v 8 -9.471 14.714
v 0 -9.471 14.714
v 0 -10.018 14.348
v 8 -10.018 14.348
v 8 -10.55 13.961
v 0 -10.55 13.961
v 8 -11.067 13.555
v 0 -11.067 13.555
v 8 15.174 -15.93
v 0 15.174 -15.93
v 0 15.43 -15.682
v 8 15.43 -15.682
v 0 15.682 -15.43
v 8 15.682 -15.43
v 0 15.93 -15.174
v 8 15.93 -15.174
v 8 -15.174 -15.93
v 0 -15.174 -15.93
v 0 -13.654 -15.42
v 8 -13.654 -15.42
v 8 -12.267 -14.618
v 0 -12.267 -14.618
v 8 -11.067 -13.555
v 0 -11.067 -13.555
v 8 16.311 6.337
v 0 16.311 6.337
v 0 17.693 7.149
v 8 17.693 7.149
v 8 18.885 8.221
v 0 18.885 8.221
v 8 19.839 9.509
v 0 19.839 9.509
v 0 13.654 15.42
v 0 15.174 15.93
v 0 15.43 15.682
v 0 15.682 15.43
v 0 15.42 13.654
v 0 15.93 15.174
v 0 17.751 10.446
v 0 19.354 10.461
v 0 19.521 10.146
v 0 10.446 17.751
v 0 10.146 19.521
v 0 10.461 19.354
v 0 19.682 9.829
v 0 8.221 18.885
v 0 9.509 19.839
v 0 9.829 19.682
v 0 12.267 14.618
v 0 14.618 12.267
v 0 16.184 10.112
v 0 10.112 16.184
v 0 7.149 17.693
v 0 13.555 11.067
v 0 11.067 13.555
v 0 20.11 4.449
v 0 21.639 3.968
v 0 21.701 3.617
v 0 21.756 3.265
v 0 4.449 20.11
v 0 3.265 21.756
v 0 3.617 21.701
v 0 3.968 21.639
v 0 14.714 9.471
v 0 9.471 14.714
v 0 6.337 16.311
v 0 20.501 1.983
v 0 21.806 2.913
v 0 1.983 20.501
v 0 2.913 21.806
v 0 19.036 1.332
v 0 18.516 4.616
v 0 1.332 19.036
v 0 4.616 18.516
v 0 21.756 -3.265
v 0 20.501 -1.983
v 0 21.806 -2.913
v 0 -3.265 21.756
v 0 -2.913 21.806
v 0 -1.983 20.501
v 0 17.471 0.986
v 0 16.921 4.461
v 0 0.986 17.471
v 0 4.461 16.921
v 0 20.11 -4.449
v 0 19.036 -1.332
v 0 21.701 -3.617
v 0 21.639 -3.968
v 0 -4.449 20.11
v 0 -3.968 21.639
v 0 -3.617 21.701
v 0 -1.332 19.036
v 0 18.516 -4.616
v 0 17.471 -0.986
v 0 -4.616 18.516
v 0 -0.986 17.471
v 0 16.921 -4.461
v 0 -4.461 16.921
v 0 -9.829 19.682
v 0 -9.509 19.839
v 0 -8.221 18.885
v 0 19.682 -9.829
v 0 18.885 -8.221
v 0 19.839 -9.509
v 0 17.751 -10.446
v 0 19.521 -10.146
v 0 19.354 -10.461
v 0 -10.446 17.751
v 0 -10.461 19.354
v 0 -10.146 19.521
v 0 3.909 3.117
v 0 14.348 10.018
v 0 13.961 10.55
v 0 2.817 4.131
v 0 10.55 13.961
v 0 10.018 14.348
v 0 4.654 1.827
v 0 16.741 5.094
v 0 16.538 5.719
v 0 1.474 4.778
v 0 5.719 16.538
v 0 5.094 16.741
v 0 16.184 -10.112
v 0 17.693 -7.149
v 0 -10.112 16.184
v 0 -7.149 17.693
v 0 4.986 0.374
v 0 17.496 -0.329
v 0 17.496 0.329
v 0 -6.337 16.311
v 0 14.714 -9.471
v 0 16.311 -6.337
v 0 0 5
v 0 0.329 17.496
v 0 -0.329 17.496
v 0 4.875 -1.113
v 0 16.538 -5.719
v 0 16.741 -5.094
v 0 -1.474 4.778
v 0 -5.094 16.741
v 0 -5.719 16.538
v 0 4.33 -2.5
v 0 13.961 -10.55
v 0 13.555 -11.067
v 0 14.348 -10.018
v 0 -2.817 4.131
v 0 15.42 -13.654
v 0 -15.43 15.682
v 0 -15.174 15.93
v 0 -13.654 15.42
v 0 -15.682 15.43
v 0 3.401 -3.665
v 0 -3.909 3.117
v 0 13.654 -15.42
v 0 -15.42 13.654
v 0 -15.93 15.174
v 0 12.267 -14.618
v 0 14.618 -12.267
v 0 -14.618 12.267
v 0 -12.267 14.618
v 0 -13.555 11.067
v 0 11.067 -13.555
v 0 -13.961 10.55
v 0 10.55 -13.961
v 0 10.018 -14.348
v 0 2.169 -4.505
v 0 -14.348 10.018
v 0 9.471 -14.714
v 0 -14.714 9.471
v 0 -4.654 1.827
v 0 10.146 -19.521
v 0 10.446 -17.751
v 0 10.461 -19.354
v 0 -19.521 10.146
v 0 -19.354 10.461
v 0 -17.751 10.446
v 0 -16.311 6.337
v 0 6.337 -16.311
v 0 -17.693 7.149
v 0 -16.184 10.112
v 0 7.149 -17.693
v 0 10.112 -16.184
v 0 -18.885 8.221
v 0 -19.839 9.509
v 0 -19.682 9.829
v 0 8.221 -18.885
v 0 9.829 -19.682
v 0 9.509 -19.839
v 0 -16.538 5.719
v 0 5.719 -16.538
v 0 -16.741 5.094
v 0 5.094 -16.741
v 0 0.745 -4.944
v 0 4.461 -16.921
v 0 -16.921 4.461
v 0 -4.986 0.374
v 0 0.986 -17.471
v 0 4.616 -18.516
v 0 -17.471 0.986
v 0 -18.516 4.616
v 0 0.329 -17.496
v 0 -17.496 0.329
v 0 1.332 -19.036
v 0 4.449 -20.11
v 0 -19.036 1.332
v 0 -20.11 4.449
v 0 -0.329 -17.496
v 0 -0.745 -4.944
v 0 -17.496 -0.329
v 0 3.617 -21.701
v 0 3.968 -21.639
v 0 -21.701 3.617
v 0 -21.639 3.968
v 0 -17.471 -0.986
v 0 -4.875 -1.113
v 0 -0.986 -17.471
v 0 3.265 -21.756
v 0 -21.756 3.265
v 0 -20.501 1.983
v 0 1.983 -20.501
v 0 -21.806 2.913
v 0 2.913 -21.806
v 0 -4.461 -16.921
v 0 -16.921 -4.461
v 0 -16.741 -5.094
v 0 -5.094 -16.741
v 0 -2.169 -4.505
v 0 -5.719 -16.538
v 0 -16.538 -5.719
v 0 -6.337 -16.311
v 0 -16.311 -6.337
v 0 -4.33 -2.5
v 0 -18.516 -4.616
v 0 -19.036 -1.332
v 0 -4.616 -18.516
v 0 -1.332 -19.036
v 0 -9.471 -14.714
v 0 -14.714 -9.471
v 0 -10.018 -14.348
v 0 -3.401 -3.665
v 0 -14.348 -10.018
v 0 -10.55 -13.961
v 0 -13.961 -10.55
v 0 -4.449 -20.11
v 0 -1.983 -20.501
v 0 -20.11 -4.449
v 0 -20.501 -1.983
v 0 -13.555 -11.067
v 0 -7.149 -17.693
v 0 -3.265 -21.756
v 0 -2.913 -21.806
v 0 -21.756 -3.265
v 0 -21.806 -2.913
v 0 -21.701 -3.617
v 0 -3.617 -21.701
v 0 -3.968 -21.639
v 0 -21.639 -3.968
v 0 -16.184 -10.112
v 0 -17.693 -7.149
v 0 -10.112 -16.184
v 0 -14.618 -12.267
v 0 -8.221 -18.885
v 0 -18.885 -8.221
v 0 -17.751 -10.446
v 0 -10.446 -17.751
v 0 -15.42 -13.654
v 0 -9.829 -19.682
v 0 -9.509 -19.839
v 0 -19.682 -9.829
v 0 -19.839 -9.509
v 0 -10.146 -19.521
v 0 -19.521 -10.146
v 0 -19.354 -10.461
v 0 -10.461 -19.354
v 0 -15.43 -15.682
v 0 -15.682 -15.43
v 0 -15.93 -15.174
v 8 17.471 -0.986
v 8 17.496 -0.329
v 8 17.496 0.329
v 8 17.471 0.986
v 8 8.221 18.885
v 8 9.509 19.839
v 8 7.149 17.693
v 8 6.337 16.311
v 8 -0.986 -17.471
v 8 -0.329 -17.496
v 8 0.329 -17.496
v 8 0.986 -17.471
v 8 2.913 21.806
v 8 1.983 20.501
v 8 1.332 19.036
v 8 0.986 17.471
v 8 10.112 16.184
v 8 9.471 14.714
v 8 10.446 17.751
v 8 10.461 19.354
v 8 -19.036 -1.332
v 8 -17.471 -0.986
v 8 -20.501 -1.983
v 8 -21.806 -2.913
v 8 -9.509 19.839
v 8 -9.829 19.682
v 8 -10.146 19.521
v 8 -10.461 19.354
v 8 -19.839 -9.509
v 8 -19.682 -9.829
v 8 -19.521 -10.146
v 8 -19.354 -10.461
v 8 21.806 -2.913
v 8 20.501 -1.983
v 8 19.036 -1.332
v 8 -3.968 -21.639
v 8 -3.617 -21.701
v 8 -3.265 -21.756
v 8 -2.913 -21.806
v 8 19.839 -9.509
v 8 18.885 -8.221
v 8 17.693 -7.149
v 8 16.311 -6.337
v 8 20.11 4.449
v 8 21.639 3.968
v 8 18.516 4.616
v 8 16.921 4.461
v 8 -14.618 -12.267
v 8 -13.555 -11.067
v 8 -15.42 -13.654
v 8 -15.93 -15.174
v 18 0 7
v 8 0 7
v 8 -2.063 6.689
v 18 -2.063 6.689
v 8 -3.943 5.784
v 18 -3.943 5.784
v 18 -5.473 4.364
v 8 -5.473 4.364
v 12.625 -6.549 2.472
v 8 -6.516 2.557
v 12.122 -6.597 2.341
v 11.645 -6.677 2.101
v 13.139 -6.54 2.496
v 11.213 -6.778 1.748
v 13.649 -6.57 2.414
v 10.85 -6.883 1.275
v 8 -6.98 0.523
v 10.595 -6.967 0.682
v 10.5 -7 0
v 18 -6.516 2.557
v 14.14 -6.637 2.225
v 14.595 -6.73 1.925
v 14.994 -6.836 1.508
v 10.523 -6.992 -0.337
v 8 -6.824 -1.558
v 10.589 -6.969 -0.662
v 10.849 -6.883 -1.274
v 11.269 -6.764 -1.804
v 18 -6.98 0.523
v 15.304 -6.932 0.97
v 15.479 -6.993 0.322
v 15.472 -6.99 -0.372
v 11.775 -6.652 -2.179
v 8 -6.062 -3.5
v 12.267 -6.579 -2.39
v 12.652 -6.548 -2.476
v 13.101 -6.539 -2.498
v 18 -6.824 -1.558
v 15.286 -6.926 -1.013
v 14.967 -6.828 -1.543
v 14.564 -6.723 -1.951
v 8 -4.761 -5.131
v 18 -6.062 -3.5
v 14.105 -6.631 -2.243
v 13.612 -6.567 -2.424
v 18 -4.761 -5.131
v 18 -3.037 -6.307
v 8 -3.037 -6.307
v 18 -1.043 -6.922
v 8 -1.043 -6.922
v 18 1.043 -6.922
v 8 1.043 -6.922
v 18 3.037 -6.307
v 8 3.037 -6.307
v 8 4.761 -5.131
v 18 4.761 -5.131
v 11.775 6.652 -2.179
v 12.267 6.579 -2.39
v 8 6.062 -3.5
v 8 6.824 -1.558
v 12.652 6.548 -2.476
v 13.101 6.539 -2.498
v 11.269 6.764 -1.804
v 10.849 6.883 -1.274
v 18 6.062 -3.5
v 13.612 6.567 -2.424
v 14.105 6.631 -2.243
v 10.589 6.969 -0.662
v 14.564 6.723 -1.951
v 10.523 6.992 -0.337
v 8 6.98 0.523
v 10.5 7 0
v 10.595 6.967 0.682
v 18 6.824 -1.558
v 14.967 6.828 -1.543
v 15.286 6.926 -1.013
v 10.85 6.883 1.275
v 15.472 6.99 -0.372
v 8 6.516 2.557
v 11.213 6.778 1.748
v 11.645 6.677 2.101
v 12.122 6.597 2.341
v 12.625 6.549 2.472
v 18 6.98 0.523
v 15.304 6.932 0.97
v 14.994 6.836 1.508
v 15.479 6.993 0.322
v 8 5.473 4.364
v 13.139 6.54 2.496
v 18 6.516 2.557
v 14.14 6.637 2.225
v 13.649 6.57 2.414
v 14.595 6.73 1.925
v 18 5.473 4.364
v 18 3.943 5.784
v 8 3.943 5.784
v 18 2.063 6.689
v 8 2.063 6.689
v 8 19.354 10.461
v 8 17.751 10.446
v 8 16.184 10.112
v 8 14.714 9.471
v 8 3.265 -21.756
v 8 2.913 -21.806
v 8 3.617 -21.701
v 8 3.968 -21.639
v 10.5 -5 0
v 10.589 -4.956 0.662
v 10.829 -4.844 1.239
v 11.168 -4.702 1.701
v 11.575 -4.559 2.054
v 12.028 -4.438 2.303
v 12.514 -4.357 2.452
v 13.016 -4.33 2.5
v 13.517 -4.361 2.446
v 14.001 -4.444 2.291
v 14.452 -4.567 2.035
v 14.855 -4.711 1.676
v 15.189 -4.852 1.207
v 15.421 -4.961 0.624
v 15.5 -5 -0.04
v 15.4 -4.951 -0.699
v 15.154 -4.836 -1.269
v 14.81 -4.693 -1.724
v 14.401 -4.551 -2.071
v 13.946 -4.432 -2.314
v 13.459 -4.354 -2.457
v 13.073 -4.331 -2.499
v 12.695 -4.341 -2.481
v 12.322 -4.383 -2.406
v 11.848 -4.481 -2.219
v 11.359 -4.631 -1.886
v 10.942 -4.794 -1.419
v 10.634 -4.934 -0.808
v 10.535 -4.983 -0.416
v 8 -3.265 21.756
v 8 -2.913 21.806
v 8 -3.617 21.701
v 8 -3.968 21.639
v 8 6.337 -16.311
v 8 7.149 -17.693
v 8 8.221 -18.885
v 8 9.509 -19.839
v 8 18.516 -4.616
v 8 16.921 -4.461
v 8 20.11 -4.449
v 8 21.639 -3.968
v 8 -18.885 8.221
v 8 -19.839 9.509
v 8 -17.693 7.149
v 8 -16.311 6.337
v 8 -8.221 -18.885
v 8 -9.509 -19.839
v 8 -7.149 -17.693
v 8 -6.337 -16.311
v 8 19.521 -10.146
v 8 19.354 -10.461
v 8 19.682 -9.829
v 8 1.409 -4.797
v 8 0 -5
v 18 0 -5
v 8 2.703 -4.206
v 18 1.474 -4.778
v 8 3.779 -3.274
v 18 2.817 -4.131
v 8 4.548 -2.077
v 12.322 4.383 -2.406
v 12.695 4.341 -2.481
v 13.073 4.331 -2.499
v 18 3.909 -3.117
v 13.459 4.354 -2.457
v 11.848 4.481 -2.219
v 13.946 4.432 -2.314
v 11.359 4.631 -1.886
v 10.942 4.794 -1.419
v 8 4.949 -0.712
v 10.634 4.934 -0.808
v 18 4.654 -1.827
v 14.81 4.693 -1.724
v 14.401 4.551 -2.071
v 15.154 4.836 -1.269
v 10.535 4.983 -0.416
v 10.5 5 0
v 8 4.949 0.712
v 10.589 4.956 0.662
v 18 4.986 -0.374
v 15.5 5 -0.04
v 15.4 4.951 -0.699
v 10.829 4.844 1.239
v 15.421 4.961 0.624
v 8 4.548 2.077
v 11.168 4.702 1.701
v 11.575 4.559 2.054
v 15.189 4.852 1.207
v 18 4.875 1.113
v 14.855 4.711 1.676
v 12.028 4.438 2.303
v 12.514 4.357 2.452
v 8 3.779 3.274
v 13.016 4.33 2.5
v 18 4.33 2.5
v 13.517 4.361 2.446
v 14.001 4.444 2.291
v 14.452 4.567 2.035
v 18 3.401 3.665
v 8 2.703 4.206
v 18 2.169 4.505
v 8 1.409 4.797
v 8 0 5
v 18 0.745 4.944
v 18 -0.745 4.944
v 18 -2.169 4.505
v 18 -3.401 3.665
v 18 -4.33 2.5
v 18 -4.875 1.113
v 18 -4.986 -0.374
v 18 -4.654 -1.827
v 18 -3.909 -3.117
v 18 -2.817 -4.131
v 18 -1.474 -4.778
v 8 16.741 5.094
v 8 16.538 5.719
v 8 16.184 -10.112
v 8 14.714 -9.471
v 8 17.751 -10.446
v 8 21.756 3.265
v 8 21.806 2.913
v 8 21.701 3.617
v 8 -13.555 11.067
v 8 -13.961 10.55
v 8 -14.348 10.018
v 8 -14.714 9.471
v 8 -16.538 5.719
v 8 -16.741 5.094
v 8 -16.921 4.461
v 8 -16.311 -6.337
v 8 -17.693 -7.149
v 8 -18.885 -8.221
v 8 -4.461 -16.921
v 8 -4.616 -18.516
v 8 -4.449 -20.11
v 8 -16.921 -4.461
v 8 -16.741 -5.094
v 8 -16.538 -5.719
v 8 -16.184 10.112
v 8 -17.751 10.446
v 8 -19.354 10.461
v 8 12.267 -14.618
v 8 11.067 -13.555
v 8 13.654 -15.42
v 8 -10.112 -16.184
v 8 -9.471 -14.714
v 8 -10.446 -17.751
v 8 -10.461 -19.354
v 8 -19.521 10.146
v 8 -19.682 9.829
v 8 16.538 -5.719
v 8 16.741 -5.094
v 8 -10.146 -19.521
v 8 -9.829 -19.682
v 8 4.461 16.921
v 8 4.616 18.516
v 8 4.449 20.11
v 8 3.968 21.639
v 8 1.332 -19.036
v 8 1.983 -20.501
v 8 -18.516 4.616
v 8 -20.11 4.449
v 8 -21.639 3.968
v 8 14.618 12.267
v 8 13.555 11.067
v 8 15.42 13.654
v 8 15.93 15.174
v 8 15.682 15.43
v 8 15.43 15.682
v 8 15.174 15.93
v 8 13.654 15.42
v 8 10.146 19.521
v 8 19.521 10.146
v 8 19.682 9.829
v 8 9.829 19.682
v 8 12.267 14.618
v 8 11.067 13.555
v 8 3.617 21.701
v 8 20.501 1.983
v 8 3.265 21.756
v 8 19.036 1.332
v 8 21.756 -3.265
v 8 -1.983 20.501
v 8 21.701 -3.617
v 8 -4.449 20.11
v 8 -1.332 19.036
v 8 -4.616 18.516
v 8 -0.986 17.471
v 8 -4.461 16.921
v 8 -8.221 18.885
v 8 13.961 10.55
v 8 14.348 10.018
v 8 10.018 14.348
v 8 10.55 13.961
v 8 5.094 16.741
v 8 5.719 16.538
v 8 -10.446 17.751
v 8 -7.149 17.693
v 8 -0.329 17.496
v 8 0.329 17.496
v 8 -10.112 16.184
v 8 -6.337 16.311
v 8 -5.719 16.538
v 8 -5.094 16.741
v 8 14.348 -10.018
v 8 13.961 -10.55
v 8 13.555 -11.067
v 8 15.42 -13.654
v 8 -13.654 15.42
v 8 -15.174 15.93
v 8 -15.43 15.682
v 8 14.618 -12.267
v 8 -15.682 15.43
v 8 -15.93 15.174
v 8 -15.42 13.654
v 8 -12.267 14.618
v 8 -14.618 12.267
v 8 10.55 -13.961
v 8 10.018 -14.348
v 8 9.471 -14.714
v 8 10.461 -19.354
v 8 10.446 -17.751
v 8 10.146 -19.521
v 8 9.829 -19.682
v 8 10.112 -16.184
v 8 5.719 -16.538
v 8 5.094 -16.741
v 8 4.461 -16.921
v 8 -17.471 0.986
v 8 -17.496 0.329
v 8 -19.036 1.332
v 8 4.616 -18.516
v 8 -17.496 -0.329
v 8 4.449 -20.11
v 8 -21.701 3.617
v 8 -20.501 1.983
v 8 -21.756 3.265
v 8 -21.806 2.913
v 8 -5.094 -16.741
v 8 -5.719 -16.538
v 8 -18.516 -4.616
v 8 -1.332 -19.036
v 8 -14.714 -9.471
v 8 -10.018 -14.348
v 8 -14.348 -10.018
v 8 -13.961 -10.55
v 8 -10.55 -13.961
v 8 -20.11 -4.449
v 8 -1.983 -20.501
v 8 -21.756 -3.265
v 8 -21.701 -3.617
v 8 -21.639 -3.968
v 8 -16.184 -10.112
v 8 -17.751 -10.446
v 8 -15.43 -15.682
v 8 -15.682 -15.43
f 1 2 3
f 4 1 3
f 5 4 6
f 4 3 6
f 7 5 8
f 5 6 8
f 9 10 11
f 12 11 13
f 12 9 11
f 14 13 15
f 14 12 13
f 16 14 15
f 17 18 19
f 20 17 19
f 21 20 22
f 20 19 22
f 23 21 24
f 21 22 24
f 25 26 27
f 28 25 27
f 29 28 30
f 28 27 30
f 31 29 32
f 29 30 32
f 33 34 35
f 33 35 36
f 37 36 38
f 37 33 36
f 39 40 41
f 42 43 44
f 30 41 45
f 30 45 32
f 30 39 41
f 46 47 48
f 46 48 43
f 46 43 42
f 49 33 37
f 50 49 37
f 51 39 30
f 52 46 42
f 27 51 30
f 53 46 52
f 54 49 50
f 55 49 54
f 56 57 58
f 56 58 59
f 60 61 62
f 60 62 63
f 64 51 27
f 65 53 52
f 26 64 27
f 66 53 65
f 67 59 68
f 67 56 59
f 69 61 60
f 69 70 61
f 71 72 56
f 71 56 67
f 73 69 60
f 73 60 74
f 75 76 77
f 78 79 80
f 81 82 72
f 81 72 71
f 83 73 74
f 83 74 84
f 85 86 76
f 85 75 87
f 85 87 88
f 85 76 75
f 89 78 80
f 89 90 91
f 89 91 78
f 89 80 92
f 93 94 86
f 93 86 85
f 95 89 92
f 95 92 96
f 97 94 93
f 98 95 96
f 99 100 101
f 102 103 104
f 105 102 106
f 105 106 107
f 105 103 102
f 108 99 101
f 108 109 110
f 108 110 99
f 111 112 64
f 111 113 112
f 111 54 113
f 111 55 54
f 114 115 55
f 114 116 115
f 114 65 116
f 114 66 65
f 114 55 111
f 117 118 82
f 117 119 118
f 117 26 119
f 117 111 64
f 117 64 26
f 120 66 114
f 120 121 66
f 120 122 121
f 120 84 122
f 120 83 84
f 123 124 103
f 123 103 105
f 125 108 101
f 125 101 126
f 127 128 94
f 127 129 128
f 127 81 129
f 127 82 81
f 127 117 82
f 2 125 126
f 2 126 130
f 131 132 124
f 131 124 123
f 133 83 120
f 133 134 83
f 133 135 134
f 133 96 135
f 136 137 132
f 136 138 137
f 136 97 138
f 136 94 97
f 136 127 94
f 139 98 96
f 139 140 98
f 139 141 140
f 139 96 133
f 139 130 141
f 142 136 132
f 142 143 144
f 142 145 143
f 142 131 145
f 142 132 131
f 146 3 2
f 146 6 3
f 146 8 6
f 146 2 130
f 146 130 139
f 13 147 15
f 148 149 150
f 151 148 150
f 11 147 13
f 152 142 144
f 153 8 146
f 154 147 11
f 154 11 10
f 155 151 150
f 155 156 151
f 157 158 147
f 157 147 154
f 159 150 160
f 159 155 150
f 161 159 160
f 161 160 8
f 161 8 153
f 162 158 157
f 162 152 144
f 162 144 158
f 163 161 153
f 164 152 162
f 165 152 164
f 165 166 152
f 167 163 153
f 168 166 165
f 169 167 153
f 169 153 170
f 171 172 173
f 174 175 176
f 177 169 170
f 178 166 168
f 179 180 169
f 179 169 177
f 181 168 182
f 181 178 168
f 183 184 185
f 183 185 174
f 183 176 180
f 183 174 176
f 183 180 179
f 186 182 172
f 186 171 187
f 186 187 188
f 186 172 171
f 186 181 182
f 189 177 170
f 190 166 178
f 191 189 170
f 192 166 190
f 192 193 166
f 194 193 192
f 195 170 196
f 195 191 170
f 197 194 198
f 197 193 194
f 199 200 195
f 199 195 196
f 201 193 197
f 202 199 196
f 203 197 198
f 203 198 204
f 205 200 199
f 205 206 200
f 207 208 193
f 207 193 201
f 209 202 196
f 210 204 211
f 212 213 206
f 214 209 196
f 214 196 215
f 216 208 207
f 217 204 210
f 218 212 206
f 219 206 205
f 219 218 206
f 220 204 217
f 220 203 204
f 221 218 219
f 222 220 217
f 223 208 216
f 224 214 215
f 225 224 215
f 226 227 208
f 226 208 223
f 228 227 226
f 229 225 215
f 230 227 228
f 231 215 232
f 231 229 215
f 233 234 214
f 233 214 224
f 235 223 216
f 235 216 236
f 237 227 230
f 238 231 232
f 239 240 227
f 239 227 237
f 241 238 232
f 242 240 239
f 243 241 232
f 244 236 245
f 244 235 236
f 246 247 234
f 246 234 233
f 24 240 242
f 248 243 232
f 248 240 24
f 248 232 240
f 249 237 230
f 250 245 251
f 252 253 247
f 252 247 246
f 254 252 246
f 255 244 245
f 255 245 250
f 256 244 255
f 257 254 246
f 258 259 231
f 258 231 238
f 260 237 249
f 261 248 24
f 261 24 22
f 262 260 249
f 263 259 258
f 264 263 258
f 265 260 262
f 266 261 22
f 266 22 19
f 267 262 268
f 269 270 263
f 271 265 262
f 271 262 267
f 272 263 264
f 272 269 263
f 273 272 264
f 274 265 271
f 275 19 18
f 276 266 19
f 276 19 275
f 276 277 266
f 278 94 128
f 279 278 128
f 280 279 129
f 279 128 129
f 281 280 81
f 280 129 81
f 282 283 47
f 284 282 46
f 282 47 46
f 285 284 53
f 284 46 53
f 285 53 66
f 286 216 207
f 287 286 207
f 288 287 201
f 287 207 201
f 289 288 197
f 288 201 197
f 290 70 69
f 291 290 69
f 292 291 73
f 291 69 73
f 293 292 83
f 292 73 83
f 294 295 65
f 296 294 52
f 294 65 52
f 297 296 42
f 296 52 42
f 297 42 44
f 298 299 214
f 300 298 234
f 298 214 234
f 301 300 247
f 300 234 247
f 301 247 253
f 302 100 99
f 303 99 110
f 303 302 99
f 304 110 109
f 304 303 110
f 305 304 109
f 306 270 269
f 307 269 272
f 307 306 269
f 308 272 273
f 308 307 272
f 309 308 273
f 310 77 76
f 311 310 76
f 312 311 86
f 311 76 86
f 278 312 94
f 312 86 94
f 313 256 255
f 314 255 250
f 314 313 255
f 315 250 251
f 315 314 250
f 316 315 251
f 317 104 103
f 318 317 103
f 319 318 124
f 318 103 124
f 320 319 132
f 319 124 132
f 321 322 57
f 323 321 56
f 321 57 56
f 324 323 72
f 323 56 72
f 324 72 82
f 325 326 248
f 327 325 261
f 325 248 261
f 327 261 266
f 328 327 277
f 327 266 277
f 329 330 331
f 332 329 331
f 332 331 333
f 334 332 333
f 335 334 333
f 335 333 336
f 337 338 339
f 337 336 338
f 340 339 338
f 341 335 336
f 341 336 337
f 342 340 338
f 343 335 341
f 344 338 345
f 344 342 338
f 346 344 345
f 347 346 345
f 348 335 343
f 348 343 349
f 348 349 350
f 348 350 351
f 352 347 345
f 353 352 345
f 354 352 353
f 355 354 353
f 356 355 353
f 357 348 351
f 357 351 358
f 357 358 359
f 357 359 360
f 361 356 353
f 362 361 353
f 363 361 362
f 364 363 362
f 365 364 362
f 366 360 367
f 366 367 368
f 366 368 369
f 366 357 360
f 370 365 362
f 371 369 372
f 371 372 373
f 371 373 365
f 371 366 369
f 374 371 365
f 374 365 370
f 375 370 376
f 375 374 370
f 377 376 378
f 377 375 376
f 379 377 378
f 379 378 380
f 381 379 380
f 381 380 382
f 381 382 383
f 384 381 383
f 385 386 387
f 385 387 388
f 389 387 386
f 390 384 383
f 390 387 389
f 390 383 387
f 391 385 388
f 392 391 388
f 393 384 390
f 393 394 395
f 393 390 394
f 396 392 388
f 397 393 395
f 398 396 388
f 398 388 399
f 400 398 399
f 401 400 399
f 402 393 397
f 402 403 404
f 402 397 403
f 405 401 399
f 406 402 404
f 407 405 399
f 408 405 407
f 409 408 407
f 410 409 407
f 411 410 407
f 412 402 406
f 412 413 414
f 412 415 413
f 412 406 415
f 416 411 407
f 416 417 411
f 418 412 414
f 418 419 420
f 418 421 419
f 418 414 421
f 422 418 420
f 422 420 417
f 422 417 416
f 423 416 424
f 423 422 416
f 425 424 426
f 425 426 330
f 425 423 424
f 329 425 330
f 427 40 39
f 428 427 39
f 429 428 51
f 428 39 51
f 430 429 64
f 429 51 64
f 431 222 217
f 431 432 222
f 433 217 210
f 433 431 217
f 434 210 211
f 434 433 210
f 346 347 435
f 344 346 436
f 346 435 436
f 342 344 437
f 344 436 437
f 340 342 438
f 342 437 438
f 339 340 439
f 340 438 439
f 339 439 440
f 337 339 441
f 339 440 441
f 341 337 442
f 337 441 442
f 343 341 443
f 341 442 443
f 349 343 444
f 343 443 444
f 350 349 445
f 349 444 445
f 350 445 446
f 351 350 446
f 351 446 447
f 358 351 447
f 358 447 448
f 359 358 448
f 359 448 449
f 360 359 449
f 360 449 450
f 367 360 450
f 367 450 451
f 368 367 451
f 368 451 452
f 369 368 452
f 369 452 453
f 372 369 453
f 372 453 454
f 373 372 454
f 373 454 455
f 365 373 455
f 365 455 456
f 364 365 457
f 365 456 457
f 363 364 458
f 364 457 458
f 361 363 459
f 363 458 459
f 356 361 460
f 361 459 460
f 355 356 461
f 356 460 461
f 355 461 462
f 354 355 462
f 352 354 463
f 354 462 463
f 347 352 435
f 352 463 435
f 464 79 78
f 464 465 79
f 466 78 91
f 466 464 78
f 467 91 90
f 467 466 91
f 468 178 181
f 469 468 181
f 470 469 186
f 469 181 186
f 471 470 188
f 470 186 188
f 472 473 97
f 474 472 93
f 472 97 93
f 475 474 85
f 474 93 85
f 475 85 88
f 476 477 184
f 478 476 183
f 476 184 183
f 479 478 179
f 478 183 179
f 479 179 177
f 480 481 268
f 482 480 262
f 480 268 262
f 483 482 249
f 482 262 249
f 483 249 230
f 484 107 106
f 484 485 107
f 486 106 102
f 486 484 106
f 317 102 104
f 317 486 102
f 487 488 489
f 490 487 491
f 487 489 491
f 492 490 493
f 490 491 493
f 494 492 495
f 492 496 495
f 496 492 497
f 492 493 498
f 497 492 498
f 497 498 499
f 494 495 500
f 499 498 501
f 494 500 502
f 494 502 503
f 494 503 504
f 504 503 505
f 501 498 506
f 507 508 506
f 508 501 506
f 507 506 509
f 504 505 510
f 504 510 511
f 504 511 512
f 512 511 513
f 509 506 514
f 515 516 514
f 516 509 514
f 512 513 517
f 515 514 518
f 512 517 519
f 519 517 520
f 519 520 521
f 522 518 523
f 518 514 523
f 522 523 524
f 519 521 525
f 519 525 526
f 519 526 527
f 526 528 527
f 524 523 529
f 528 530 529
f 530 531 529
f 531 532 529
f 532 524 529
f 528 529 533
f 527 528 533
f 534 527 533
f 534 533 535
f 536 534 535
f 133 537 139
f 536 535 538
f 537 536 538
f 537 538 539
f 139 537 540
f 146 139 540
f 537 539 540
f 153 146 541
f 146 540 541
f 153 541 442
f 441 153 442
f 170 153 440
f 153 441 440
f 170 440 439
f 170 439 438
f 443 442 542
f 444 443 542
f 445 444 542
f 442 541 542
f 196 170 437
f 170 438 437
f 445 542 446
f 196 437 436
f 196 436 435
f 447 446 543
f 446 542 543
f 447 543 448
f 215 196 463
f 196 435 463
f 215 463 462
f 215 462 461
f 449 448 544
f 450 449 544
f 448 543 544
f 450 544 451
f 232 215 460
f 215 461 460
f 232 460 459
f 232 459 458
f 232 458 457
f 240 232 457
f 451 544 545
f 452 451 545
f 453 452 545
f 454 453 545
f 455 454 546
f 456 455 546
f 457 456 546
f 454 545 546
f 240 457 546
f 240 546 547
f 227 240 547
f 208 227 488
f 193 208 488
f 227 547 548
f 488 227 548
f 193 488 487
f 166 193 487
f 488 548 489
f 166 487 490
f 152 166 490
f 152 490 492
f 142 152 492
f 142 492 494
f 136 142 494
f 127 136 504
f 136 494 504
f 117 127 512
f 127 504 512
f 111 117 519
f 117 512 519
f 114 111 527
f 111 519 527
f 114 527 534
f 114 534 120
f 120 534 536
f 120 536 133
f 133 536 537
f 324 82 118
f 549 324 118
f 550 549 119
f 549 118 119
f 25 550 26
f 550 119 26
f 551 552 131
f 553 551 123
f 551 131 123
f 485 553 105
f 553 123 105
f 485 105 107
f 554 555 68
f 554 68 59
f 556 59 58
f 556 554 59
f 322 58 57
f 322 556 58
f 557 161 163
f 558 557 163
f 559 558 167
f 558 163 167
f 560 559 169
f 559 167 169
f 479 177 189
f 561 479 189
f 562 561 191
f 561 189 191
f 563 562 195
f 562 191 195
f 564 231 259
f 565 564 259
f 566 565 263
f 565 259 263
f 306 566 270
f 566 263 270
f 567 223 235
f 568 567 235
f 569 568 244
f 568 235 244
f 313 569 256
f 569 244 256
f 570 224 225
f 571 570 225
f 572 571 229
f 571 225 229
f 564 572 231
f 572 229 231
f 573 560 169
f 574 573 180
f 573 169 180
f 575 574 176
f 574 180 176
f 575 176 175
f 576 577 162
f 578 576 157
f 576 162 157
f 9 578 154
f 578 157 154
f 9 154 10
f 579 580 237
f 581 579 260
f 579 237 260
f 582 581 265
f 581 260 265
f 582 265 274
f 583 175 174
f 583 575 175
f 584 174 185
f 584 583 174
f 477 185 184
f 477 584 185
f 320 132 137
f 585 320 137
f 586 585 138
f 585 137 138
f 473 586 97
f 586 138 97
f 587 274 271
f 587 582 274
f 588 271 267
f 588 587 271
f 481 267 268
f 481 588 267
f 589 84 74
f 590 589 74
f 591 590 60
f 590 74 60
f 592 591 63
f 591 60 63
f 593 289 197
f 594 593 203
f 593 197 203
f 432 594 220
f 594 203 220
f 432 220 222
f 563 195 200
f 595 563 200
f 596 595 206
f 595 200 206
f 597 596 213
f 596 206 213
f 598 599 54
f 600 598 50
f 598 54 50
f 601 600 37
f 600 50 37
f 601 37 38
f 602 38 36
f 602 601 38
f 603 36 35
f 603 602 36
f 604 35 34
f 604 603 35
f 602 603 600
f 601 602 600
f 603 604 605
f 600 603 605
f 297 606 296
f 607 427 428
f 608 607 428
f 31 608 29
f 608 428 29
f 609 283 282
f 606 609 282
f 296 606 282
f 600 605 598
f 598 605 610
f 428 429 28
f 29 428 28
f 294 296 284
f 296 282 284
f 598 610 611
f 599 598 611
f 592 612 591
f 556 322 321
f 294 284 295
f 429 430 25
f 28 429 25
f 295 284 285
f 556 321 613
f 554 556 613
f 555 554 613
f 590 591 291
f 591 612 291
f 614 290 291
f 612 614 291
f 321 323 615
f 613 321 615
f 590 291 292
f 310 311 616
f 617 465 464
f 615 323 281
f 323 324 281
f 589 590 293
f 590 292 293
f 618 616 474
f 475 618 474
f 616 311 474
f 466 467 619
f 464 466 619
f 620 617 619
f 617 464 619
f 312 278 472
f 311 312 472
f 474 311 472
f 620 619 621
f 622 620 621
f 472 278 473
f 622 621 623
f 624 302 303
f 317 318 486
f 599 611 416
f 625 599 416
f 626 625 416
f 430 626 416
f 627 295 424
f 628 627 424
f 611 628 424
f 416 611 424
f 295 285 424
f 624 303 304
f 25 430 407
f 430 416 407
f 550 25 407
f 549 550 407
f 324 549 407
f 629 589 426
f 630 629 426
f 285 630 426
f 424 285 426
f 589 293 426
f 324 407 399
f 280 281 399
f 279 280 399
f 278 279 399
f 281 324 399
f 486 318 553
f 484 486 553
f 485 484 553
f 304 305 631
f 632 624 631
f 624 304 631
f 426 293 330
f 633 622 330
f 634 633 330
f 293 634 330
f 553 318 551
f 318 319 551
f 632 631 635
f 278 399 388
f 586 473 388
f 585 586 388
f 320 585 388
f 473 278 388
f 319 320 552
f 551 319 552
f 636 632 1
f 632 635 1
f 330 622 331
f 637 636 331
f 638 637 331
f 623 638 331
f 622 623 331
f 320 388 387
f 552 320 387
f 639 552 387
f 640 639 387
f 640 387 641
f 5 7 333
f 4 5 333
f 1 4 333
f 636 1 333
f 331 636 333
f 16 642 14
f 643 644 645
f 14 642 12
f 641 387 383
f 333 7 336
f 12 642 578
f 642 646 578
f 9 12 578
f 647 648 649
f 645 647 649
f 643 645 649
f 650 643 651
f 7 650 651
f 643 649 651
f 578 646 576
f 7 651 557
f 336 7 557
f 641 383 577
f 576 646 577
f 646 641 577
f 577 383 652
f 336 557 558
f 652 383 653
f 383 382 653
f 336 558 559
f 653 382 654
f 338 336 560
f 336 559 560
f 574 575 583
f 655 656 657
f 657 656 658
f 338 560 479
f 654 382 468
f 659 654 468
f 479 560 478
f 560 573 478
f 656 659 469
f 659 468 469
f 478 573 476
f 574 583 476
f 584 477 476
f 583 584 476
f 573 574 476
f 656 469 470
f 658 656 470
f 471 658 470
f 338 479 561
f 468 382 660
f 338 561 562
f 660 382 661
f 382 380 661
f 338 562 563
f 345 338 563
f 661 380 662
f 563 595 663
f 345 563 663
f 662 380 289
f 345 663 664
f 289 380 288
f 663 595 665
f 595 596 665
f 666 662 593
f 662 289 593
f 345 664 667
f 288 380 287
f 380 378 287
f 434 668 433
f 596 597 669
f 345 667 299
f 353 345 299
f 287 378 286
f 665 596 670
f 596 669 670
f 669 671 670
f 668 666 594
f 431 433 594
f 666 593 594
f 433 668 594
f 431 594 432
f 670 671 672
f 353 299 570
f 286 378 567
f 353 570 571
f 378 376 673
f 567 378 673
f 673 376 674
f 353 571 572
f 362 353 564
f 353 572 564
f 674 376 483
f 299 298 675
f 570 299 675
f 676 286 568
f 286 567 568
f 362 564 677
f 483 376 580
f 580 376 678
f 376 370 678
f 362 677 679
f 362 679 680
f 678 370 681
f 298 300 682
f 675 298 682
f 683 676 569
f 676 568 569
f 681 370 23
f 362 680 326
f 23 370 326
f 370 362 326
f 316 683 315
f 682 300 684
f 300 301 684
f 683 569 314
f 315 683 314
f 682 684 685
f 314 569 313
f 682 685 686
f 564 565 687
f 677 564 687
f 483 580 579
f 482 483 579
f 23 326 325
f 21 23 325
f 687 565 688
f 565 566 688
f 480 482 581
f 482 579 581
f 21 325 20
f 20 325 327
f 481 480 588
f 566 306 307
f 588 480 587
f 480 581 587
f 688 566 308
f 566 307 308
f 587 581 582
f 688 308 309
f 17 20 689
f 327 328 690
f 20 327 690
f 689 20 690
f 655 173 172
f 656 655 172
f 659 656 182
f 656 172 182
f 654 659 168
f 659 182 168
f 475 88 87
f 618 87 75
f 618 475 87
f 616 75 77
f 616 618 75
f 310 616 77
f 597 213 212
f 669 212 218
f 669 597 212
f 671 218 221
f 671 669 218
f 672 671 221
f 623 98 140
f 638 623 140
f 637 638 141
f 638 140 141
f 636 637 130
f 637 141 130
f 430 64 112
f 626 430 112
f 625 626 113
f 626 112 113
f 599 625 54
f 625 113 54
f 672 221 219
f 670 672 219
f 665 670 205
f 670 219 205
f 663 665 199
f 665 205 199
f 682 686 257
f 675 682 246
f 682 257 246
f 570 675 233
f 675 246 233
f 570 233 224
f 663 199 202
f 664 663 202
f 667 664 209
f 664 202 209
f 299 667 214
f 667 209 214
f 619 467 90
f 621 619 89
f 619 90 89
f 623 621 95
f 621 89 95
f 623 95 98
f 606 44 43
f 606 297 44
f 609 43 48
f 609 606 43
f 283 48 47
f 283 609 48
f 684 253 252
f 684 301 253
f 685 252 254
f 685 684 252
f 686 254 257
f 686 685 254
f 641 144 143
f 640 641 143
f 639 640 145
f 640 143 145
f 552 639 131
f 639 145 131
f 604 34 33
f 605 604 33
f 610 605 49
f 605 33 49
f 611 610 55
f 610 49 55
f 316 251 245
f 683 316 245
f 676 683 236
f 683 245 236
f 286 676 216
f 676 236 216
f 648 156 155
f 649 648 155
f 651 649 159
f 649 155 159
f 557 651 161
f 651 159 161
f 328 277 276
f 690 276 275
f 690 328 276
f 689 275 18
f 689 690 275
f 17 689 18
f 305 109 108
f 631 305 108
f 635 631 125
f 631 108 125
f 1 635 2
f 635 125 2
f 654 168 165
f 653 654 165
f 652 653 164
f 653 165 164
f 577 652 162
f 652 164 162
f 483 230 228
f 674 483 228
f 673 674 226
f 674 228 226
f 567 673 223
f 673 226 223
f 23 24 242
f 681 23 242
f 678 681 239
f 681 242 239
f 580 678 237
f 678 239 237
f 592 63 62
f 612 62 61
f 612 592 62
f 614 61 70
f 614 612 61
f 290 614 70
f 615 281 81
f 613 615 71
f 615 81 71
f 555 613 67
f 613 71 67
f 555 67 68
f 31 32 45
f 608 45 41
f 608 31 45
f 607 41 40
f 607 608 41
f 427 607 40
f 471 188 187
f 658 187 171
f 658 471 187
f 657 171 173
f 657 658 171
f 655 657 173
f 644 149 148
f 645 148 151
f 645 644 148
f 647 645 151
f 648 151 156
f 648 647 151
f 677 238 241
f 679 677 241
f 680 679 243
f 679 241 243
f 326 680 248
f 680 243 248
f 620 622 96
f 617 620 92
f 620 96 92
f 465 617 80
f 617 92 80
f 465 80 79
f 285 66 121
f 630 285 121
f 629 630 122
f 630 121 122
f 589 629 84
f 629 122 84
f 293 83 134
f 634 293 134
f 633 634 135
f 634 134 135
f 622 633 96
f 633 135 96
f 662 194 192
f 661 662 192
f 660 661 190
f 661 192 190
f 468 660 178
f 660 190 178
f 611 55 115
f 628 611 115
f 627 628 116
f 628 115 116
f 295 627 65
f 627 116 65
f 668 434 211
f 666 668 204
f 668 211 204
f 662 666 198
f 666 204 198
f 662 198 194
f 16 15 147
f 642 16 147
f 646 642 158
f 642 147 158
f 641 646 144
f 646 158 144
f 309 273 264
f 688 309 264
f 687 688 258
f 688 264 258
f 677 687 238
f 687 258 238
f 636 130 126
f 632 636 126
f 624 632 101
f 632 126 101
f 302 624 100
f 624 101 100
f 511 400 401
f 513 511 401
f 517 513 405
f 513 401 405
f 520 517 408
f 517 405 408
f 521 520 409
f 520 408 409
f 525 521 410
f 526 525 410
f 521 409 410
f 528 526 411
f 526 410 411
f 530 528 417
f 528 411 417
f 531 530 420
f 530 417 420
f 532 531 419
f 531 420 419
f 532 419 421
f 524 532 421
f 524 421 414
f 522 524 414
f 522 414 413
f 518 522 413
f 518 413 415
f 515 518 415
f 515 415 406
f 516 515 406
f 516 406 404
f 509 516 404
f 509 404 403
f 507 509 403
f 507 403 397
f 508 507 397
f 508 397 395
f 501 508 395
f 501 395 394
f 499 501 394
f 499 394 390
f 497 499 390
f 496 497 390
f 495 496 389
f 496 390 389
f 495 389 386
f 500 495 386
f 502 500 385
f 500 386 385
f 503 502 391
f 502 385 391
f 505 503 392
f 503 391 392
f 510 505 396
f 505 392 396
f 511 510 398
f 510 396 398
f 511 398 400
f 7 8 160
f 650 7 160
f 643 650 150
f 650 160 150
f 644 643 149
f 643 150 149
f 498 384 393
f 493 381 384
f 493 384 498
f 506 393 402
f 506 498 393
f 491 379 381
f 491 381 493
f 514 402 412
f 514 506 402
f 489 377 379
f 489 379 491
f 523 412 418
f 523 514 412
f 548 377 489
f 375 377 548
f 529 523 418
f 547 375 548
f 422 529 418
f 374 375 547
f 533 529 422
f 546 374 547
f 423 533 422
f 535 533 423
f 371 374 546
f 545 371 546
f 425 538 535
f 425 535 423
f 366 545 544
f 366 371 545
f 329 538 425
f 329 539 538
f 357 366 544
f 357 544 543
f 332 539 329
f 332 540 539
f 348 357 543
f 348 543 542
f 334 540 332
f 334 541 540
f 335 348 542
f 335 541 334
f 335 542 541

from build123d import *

# Parameters (mm, degrees)
BASPROSKE_W           = 8
BASPROSKE_H           = 22
TOOTHCUT_DEPTH        = 33.124756808
TEETHCUTS_COUNT       = 20
TEETHCUTS_ANGLE       = 342
BORSKE_R              = 5
BORE_DEPTH            = 50.0000508
BOSS_EXTRUDE1_START   = 10
SKETCH1_R             = 7
SKETCH1_R_2           = 5
BOSS_EXTRUDE1_DEPTH   = 10
F_5_0MM_DOWEL_HOLE1_D = 5


with BuildPart() as part:
    # BasProSke → Base-Revolve (revolve)
    with BuildSketch(Plane(origin=(0, 0, 0), x_dir=(1, 0, 0), z_dir=(0, 1, 0))):
        with Locations((4, 11)):
            Rectangle(BASPROSKE_W, BASPROSKE_H)
    revolve(axis=Axis((-10, 0, 0), (1, 0, 0)))

    # TooCutSke → ToothCut (cut, through all)
    with BuildSketch(Plane(origin=(0, 0, 0), x_dir=(0, 0, -1), z_dir=(1, 0, 0))):
        with BuildLine():
            ThreePointArc((0.986171591, 17.471189616), (0, 17.499), (-0.986171591, 17.471189616))
            ThreePointArc((-0.986171591, 17.471189616), (-1.626916196, 19.798789858), (-2.932850173, 21.829260982))
            ThreePointArc((-2.932850173, 21.829260982), (0, 22.0254), (2.932850173, 21.829260982))
            ThreePointArc((2.932850173, 21.829260982), (1.626916196, 19.798789858), (0.986171591, 17.471189616))
        make_face()
    toothcut = extrude(amount=TOOTHCUT_DEPTH, mode=Mode.SUBTRACT)

    # TeethCuts: ToothCut ×20 about axis
    teethcuts_axis = Axis((-10, 0, 0), (1, 0, 0))
    for i in range(1, TEETHCUTS_COUNT):
        add(toothcut.rotate(teethcuts_axis, i * TEETHCUTS_ANGLE / (TEETHCUTS_COUNT - 1)), mode=Mode.SUBTRACT)

    # BorSke → Bore (cut, symmetric)
    with BuildSketch(Plane(origin=(0, 0, 0), x_dir=(0, 0, -1), z_dir=(1, 0, 0))):
        Circle(BORSKE_R)
    extrude(amount=BORE_DEPTH, both=True, mode=Mode.SUBTRACT)

    # Sketch1 → Boss-Extrude1 (add)
    with BuildSketch(Plane(origin=(8, 0, 0), x_dir=(0, 0, -1), z_dir=(1, 0, 0)).offset(BOSS_EXTRUDE1_START)):
        Circle(SKETCH1_R)
        Circle(SKETCH1_R_2, mode=Mode.SUBTRACT)
    extrude(amount=-BOSS_EXTRUDE1_DEPTH)

    # Ø5.0mm Dowel Hole1 (through all)
    with Locations(Plane.XZ.offset(7)):
        with Locations((13, 0)):
            Hole(F_5_0MM_DOWEL_HOLE1_D / 2)


solid = part.part
